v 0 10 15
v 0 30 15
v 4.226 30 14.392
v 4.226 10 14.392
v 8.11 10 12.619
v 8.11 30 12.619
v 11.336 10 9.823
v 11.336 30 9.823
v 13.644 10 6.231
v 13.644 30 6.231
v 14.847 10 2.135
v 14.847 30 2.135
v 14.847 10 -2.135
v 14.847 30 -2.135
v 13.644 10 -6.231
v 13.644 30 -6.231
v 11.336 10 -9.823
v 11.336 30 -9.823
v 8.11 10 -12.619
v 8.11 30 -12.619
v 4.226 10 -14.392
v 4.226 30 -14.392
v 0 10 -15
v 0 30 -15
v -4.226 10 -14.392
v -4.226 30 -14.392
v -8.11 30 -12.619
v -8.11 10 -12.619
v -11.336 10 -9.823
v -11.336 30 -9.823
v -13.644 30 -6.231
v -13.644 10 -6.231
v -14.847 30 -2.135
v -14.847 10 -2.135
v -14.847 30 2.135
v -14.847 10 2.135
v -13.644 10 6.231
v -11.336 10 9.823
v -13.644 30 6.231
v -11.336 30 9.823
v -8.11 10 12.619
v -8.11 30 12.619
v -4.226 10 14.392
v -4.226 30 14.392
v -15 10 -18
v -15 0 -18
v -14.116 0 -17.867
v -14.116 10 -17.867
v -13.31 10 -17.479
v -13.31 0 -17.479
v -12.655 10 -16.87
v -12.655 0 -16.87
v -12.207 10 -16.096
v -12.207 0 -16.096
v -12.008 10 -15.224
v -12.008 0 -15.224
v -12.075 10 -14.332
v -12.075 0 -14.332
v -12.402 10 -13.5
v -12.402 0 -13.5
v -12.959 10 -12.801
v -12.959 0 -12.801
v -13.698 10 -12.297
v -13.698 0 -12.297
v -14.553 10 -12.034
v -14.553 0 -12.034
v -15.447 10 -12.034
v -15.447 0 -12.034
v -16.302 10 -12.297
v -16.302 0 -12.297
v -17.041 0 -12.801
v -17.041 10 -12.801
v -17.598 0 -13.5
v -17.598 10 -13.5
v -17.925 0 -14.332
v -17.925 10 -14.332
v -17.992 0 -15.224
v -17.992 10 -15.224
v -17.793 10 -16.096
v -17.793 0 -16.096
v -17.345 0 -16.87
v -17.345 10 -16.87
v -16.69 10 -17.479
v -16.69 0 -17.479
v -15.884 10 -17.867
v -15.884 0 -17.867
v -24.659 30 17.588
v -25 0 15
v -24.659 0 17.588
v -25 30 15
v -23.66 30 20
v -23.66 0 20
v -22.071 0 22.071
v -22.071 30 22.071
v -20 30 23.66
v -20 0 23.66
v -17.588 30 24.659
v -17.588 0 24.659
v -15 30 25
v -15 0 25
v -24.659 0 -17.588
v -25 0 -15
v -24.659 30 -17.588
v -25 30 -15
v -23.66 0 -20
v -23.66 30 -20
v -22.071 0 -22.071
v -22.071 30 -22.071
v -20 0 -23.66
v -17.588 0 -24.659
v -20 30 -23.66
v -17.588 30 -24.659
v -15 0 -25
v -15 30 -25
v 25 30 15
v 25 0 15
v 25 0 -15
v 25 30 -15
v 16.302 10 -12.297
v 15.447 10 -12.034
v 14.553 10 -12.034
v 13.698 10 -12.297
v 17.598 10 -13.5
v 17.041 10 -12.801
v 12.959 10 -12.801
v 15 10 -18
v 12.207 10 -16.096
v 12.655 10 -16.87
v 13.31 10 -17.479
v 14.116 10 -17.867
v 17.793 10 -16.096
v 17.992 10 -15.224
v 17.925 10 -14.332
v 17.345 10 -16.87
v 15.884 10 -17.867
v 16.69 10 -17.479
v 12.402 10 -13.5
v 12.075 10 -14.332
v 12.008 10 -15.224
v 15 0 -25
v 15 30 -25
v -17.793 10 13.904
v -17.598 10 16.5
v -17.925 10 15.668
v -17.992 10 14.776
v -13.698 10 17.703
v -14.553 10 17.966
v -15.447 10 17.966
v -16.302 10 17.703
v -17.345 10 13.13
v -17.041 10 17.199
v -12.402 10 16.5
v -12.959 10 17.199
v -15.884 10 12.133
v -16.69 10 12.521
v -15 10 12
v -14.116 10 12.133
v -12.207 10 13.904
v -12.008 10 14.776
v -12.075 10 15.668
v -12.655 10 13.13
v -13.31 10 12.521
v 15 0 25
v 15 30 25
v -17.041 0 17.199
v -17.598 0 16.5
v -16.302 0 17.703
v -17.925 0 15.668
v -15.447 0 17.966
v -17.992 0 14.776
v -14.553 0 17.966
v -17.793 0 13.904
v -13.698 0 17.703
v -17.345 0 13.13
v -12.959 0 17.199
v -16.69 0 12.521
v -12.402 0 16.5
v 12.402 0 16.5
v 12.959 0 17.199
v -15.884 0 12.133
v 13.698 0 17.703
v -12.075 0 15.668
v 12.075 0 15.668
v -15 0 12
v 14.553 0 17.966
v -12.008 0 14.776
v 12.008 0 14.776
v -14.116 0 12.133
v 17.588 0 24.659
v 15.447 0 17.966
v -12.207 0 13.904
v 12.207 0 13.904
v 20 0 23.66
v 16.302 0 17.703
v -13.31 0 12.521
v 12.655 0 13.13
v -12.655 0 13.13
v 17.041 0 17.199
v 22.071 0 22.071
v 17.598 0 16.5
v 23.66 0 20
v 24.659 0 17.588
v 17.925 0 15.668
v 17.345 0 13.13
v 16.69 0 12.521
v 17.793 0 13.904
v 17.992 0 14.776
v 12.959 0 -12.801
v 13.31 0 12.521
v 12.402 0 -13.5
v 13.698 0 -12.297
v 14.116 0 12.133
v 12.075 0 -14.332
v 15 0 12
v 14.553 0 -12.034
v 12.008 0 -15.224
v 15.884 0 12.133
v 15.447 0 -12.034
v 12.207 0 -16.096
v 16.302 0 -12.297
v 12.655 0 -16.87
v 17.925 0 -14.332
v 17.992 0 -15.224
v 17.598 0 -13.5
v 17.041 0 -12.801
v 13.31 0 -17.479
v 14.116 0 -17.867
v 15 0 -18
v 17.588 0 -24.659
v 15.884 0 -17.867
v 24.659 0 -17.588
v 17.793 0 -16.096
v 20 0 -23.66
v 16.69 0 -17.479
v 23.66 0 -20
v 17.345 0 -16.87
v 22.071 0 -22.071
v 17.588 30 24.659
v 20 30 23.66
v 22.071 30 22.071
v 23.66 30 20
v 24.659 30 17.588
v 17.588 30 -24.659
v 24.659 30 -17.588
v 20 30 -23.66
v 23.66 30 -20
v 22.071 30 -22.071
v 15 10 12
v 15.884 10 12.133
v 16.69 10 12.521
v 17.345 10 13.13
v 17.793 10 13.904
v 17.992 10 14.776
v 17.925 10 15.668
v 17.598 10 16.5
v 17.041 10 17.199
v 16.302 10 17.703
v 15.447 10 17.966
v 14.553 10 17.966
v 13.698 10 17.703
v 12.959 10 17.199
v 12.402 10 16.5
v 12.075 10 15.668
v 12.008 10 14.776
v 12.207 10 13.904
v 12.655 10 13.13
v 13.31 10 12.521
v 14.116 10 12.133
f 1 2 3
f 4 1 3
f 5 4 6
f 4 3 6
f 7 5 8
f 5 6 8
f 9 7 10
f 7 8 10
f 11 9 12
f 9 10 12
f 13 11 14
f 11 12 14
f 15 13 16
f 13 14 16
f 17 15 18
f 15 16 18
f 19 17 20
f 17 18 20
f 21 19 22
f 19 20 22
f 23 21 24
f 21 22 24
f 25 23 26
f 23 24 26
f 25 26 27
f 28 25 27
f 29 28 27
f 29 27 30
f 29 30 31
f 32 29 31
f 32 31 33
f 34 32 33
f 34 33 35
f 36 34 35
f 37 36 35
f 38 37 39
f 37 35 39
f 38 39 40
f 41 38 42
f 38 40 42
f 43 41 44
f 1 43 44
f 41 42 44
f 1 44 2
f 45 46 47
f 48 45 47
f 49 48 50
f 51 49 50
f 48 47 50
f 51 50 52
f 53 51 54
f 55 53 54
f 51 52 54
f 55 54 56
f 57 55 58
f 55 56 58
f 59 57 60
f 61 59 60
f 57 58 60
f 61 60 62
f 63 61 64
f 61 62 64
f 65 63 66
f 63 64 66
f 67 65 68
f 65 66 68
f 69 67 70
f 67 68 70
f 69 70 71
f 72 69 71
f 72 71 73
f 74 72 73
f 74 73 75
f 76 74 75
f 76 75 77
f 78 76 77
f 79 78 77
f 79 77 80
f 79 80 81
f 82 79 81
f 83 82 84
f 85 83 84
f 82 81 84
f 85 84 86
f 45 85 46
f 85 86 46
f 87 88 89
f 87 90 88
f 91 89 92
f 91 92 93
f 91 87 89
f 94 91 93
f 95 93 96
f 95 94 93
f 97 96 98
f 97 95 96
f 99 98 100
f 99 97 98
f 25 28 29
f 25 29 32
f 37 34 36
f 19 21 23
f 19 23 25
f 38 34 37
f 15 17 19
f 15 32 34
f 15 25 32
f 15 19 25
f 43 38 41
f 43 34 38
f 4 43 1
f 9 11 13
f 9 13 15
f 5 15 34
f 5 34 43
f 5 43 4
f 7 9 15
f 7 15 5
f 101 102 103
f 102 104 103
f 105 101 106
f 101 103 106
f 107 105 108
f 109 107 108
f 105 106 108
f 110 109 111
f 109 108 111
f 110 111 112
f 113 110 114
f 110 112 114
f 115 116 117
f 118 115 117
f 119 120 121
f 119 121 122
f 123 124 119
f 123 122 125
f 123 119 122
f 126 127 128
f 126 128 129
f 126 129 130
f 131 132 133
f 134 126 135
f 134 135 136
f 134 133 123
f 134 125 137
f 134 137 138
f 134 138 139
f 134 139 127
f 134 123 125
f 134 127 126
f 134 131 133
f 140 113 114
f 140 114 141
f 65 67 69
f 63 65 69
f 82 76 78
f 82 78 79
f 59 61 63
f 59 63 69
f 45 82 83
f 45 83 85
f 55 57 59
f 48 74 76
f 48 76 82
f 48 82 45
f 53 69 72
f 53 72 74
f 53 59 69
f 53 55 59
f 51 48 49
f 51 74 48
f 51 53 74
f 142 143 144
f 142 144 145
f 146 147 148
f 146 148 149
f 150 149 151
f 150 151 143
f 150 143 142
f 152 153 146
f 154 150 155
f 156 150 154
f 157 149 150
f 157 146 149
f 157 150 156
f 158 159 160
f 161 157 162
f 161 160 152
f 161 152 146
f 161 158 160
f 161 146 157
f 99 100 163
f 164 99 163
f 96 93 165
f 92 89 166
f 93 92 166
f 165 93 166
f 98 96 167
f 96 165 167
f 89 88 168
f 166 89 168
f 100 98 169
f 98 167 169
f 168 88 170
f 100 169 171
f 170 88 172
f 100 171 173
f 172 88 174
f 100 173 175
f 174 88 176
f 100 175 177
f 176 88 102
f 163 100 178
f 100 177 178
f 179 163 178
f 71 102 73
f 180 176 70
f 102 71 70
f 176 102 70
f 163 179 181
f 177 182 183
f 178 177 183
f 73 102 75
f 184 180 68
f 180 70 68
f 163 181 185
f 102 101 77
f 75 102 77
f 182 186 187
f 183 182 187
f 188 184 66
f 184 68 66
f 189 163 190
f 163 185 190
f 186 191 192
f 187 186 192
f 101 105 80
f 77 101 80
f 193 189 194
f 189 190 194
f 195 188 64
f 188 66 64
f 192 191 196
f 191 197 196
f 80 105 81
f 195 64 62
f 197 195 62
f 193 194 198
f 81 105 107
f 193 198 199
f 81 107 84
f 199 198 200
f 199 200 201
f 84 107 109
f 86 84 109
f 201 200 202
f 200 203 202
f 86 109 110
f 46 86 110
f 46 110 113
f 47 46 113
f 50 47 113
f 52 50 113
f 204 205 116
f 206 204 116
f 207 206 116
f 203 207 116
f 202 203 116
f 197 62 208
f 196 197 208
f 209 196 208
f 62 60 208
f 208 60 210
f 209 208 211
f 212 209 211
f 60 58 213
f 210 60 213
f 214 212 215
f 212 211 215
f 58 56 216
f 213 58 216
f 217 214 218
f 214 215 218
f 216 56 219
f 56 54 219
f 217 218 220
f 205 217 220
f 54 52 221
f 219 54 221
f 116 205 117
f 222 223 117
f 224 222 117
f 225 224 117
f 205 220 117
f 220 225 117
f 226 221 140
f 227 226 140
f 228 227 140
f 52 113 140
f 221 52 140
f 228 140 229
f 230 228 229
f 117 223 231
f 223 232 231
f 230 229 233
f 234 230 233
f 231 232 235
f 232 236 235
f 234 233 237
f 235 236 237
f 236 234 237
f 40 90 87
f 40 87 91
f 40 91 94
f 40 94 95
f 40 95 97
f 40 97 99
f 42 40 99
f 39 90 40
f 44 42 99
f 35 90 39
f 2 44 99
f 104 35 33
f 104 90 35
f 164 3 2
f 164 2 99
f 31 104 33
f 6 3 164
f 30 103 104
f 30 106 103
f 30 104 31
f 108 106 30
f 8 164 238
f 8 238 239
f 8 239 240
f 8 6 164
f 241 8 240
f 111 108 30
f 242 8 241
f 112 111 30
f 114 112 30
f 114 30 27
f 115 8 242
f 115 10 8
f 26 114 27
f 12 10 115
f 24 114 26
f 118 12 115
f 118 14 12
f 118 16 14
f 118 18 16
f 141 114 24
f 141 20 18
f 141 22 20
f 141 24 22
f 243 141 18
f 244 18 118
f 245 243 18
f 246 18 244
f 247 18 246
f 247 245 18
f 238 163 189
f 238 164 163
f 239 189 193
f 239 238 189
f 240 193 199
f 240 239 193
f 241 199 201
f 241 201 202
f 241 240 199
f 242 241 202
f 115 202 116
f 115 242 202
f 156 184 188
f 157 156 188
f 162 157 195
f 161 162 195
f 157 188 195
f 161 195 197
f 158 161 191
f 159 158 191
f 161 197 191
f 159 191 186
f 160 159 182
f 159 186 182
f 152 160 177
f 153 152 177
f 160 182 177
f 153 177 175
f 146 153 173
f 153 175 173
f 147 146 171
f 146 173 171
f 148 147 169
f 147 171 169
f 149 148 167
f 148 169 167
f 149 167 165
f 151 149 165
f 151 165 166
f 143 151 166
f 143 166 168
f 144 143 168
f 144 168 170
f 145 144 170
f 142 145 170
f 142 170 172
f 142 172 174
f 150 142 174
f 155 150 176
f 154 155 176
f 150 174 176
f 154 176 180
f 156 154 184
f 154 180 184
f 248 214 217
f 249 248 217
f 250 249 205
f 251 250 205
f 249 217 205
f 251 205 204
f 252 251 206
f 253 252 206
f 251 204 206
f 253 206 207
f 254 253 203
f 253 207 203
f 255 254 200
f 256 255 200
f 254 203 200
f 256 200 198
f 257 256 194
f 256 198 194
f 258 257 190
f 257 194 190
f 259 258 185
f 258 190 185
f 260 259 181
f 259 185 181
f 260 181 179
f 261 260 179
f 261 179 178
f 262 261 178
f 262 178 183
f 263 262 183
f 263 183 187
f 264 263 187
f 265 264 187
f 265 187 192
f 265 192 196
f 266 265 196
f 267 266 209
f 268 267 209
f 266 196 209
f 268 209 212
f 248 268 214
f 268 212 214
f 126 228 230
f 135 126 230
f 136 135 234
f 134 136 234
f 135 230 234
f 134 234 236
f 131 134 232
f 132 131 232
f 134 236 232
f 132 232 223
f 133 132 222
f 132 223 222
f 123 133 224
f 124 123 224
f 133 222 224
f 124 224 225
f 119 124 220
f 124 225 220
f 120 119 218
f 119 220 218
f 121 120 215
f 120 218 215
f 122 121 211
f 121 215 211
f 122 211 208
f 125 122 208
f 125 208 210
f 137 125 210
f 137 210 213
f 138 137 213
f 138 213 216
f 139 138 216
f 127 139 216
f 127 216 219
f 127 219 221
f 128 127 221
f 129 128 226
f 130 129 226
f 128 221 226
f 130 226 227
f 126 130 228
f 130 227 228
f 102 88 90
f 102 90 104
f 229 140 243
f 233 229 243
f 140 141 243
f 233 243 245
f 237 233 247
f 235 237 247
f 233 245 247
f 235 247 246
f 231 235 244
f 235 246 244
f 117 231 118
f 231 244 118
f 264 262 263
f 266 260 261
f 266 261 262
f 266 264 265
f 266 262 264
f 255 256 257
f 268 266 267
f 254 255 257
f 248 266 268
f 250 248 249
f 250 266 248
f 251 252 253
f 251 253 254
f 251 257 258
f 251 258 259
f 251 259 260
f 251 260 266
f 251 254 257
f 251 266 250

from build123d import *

# Parameters (mm, degrees)
SKETCH1_W           = 50
SKETCH1_H           = 50
BOSS_EXTRUDE1_DEPTH = 30
SKETCH2_R           = 15
CUT_EXTRUDE1_DEPTH  = 20
FILLET1_R           = 10
SKETCH3_R           = 3
CUT_EXTRUDE2_DEPTH  = 10


with BuildPart() as part:
    # Sketch1 → Boss-Extrude1 (new body)
    with BuildSketch(Plane(origin=(0, 0, 0), x_dir=(1, 0, 0), z_dir=(0, 1, 0))):
        Rectangle(SKETCH1_W, SKETCH1_H)
    extrude(amount=BOSS_EXTRUDE1_DEPTH)

    # Sketch2 → Cut-Extrude1 (cut)
    with BuildSketch(Plane(origin=(0, 30, 0), x_dir=(1, 0, 0), z_dir=(0, 1, 0))):
        with Locations(Location((0, 0, 0), (0, 0, 270))):
            Circle(SKETCH2_R)
    extrude(amount=-CUT_EXTRUDE1_DEPTH, mode=Mode.SUBTRACT)

    # Fillet1
    fillet1_edges = [part.edges().sort_by_distance(p)[0] for p in [
        (25, 15, 25),
        (-25, 15, 25),
        (-25, 15, -25),
        (25, 15, -25),
    ]]
    fillet(fillet1_edges, radius=FILLET1_R)

    # Sketch3 → Cut-Extrude2 (cut)
    with BuildSketch(Plane.XZ):
        with Locations(Location((15, -15, 0), (0, 0, 270))):
            Circle(SKETCH3_R)
        with Locations(Location((-15, -15, 0), (0, 0, 270))):
            Circle(SKETCH3_R)
        with Locations(Location((-15, 15, 0), (0, 0, 270))):
            Circle(SKETCH3_R)
        with Locations(Location((15, 15, 0), (0, 0, 270))):
            Circle(SKETCH3_R)
    extrude(amount=-CUT_EXTRUDE2_DEPTH, mode=Mode.SUBTRACT)


solid = part.part
